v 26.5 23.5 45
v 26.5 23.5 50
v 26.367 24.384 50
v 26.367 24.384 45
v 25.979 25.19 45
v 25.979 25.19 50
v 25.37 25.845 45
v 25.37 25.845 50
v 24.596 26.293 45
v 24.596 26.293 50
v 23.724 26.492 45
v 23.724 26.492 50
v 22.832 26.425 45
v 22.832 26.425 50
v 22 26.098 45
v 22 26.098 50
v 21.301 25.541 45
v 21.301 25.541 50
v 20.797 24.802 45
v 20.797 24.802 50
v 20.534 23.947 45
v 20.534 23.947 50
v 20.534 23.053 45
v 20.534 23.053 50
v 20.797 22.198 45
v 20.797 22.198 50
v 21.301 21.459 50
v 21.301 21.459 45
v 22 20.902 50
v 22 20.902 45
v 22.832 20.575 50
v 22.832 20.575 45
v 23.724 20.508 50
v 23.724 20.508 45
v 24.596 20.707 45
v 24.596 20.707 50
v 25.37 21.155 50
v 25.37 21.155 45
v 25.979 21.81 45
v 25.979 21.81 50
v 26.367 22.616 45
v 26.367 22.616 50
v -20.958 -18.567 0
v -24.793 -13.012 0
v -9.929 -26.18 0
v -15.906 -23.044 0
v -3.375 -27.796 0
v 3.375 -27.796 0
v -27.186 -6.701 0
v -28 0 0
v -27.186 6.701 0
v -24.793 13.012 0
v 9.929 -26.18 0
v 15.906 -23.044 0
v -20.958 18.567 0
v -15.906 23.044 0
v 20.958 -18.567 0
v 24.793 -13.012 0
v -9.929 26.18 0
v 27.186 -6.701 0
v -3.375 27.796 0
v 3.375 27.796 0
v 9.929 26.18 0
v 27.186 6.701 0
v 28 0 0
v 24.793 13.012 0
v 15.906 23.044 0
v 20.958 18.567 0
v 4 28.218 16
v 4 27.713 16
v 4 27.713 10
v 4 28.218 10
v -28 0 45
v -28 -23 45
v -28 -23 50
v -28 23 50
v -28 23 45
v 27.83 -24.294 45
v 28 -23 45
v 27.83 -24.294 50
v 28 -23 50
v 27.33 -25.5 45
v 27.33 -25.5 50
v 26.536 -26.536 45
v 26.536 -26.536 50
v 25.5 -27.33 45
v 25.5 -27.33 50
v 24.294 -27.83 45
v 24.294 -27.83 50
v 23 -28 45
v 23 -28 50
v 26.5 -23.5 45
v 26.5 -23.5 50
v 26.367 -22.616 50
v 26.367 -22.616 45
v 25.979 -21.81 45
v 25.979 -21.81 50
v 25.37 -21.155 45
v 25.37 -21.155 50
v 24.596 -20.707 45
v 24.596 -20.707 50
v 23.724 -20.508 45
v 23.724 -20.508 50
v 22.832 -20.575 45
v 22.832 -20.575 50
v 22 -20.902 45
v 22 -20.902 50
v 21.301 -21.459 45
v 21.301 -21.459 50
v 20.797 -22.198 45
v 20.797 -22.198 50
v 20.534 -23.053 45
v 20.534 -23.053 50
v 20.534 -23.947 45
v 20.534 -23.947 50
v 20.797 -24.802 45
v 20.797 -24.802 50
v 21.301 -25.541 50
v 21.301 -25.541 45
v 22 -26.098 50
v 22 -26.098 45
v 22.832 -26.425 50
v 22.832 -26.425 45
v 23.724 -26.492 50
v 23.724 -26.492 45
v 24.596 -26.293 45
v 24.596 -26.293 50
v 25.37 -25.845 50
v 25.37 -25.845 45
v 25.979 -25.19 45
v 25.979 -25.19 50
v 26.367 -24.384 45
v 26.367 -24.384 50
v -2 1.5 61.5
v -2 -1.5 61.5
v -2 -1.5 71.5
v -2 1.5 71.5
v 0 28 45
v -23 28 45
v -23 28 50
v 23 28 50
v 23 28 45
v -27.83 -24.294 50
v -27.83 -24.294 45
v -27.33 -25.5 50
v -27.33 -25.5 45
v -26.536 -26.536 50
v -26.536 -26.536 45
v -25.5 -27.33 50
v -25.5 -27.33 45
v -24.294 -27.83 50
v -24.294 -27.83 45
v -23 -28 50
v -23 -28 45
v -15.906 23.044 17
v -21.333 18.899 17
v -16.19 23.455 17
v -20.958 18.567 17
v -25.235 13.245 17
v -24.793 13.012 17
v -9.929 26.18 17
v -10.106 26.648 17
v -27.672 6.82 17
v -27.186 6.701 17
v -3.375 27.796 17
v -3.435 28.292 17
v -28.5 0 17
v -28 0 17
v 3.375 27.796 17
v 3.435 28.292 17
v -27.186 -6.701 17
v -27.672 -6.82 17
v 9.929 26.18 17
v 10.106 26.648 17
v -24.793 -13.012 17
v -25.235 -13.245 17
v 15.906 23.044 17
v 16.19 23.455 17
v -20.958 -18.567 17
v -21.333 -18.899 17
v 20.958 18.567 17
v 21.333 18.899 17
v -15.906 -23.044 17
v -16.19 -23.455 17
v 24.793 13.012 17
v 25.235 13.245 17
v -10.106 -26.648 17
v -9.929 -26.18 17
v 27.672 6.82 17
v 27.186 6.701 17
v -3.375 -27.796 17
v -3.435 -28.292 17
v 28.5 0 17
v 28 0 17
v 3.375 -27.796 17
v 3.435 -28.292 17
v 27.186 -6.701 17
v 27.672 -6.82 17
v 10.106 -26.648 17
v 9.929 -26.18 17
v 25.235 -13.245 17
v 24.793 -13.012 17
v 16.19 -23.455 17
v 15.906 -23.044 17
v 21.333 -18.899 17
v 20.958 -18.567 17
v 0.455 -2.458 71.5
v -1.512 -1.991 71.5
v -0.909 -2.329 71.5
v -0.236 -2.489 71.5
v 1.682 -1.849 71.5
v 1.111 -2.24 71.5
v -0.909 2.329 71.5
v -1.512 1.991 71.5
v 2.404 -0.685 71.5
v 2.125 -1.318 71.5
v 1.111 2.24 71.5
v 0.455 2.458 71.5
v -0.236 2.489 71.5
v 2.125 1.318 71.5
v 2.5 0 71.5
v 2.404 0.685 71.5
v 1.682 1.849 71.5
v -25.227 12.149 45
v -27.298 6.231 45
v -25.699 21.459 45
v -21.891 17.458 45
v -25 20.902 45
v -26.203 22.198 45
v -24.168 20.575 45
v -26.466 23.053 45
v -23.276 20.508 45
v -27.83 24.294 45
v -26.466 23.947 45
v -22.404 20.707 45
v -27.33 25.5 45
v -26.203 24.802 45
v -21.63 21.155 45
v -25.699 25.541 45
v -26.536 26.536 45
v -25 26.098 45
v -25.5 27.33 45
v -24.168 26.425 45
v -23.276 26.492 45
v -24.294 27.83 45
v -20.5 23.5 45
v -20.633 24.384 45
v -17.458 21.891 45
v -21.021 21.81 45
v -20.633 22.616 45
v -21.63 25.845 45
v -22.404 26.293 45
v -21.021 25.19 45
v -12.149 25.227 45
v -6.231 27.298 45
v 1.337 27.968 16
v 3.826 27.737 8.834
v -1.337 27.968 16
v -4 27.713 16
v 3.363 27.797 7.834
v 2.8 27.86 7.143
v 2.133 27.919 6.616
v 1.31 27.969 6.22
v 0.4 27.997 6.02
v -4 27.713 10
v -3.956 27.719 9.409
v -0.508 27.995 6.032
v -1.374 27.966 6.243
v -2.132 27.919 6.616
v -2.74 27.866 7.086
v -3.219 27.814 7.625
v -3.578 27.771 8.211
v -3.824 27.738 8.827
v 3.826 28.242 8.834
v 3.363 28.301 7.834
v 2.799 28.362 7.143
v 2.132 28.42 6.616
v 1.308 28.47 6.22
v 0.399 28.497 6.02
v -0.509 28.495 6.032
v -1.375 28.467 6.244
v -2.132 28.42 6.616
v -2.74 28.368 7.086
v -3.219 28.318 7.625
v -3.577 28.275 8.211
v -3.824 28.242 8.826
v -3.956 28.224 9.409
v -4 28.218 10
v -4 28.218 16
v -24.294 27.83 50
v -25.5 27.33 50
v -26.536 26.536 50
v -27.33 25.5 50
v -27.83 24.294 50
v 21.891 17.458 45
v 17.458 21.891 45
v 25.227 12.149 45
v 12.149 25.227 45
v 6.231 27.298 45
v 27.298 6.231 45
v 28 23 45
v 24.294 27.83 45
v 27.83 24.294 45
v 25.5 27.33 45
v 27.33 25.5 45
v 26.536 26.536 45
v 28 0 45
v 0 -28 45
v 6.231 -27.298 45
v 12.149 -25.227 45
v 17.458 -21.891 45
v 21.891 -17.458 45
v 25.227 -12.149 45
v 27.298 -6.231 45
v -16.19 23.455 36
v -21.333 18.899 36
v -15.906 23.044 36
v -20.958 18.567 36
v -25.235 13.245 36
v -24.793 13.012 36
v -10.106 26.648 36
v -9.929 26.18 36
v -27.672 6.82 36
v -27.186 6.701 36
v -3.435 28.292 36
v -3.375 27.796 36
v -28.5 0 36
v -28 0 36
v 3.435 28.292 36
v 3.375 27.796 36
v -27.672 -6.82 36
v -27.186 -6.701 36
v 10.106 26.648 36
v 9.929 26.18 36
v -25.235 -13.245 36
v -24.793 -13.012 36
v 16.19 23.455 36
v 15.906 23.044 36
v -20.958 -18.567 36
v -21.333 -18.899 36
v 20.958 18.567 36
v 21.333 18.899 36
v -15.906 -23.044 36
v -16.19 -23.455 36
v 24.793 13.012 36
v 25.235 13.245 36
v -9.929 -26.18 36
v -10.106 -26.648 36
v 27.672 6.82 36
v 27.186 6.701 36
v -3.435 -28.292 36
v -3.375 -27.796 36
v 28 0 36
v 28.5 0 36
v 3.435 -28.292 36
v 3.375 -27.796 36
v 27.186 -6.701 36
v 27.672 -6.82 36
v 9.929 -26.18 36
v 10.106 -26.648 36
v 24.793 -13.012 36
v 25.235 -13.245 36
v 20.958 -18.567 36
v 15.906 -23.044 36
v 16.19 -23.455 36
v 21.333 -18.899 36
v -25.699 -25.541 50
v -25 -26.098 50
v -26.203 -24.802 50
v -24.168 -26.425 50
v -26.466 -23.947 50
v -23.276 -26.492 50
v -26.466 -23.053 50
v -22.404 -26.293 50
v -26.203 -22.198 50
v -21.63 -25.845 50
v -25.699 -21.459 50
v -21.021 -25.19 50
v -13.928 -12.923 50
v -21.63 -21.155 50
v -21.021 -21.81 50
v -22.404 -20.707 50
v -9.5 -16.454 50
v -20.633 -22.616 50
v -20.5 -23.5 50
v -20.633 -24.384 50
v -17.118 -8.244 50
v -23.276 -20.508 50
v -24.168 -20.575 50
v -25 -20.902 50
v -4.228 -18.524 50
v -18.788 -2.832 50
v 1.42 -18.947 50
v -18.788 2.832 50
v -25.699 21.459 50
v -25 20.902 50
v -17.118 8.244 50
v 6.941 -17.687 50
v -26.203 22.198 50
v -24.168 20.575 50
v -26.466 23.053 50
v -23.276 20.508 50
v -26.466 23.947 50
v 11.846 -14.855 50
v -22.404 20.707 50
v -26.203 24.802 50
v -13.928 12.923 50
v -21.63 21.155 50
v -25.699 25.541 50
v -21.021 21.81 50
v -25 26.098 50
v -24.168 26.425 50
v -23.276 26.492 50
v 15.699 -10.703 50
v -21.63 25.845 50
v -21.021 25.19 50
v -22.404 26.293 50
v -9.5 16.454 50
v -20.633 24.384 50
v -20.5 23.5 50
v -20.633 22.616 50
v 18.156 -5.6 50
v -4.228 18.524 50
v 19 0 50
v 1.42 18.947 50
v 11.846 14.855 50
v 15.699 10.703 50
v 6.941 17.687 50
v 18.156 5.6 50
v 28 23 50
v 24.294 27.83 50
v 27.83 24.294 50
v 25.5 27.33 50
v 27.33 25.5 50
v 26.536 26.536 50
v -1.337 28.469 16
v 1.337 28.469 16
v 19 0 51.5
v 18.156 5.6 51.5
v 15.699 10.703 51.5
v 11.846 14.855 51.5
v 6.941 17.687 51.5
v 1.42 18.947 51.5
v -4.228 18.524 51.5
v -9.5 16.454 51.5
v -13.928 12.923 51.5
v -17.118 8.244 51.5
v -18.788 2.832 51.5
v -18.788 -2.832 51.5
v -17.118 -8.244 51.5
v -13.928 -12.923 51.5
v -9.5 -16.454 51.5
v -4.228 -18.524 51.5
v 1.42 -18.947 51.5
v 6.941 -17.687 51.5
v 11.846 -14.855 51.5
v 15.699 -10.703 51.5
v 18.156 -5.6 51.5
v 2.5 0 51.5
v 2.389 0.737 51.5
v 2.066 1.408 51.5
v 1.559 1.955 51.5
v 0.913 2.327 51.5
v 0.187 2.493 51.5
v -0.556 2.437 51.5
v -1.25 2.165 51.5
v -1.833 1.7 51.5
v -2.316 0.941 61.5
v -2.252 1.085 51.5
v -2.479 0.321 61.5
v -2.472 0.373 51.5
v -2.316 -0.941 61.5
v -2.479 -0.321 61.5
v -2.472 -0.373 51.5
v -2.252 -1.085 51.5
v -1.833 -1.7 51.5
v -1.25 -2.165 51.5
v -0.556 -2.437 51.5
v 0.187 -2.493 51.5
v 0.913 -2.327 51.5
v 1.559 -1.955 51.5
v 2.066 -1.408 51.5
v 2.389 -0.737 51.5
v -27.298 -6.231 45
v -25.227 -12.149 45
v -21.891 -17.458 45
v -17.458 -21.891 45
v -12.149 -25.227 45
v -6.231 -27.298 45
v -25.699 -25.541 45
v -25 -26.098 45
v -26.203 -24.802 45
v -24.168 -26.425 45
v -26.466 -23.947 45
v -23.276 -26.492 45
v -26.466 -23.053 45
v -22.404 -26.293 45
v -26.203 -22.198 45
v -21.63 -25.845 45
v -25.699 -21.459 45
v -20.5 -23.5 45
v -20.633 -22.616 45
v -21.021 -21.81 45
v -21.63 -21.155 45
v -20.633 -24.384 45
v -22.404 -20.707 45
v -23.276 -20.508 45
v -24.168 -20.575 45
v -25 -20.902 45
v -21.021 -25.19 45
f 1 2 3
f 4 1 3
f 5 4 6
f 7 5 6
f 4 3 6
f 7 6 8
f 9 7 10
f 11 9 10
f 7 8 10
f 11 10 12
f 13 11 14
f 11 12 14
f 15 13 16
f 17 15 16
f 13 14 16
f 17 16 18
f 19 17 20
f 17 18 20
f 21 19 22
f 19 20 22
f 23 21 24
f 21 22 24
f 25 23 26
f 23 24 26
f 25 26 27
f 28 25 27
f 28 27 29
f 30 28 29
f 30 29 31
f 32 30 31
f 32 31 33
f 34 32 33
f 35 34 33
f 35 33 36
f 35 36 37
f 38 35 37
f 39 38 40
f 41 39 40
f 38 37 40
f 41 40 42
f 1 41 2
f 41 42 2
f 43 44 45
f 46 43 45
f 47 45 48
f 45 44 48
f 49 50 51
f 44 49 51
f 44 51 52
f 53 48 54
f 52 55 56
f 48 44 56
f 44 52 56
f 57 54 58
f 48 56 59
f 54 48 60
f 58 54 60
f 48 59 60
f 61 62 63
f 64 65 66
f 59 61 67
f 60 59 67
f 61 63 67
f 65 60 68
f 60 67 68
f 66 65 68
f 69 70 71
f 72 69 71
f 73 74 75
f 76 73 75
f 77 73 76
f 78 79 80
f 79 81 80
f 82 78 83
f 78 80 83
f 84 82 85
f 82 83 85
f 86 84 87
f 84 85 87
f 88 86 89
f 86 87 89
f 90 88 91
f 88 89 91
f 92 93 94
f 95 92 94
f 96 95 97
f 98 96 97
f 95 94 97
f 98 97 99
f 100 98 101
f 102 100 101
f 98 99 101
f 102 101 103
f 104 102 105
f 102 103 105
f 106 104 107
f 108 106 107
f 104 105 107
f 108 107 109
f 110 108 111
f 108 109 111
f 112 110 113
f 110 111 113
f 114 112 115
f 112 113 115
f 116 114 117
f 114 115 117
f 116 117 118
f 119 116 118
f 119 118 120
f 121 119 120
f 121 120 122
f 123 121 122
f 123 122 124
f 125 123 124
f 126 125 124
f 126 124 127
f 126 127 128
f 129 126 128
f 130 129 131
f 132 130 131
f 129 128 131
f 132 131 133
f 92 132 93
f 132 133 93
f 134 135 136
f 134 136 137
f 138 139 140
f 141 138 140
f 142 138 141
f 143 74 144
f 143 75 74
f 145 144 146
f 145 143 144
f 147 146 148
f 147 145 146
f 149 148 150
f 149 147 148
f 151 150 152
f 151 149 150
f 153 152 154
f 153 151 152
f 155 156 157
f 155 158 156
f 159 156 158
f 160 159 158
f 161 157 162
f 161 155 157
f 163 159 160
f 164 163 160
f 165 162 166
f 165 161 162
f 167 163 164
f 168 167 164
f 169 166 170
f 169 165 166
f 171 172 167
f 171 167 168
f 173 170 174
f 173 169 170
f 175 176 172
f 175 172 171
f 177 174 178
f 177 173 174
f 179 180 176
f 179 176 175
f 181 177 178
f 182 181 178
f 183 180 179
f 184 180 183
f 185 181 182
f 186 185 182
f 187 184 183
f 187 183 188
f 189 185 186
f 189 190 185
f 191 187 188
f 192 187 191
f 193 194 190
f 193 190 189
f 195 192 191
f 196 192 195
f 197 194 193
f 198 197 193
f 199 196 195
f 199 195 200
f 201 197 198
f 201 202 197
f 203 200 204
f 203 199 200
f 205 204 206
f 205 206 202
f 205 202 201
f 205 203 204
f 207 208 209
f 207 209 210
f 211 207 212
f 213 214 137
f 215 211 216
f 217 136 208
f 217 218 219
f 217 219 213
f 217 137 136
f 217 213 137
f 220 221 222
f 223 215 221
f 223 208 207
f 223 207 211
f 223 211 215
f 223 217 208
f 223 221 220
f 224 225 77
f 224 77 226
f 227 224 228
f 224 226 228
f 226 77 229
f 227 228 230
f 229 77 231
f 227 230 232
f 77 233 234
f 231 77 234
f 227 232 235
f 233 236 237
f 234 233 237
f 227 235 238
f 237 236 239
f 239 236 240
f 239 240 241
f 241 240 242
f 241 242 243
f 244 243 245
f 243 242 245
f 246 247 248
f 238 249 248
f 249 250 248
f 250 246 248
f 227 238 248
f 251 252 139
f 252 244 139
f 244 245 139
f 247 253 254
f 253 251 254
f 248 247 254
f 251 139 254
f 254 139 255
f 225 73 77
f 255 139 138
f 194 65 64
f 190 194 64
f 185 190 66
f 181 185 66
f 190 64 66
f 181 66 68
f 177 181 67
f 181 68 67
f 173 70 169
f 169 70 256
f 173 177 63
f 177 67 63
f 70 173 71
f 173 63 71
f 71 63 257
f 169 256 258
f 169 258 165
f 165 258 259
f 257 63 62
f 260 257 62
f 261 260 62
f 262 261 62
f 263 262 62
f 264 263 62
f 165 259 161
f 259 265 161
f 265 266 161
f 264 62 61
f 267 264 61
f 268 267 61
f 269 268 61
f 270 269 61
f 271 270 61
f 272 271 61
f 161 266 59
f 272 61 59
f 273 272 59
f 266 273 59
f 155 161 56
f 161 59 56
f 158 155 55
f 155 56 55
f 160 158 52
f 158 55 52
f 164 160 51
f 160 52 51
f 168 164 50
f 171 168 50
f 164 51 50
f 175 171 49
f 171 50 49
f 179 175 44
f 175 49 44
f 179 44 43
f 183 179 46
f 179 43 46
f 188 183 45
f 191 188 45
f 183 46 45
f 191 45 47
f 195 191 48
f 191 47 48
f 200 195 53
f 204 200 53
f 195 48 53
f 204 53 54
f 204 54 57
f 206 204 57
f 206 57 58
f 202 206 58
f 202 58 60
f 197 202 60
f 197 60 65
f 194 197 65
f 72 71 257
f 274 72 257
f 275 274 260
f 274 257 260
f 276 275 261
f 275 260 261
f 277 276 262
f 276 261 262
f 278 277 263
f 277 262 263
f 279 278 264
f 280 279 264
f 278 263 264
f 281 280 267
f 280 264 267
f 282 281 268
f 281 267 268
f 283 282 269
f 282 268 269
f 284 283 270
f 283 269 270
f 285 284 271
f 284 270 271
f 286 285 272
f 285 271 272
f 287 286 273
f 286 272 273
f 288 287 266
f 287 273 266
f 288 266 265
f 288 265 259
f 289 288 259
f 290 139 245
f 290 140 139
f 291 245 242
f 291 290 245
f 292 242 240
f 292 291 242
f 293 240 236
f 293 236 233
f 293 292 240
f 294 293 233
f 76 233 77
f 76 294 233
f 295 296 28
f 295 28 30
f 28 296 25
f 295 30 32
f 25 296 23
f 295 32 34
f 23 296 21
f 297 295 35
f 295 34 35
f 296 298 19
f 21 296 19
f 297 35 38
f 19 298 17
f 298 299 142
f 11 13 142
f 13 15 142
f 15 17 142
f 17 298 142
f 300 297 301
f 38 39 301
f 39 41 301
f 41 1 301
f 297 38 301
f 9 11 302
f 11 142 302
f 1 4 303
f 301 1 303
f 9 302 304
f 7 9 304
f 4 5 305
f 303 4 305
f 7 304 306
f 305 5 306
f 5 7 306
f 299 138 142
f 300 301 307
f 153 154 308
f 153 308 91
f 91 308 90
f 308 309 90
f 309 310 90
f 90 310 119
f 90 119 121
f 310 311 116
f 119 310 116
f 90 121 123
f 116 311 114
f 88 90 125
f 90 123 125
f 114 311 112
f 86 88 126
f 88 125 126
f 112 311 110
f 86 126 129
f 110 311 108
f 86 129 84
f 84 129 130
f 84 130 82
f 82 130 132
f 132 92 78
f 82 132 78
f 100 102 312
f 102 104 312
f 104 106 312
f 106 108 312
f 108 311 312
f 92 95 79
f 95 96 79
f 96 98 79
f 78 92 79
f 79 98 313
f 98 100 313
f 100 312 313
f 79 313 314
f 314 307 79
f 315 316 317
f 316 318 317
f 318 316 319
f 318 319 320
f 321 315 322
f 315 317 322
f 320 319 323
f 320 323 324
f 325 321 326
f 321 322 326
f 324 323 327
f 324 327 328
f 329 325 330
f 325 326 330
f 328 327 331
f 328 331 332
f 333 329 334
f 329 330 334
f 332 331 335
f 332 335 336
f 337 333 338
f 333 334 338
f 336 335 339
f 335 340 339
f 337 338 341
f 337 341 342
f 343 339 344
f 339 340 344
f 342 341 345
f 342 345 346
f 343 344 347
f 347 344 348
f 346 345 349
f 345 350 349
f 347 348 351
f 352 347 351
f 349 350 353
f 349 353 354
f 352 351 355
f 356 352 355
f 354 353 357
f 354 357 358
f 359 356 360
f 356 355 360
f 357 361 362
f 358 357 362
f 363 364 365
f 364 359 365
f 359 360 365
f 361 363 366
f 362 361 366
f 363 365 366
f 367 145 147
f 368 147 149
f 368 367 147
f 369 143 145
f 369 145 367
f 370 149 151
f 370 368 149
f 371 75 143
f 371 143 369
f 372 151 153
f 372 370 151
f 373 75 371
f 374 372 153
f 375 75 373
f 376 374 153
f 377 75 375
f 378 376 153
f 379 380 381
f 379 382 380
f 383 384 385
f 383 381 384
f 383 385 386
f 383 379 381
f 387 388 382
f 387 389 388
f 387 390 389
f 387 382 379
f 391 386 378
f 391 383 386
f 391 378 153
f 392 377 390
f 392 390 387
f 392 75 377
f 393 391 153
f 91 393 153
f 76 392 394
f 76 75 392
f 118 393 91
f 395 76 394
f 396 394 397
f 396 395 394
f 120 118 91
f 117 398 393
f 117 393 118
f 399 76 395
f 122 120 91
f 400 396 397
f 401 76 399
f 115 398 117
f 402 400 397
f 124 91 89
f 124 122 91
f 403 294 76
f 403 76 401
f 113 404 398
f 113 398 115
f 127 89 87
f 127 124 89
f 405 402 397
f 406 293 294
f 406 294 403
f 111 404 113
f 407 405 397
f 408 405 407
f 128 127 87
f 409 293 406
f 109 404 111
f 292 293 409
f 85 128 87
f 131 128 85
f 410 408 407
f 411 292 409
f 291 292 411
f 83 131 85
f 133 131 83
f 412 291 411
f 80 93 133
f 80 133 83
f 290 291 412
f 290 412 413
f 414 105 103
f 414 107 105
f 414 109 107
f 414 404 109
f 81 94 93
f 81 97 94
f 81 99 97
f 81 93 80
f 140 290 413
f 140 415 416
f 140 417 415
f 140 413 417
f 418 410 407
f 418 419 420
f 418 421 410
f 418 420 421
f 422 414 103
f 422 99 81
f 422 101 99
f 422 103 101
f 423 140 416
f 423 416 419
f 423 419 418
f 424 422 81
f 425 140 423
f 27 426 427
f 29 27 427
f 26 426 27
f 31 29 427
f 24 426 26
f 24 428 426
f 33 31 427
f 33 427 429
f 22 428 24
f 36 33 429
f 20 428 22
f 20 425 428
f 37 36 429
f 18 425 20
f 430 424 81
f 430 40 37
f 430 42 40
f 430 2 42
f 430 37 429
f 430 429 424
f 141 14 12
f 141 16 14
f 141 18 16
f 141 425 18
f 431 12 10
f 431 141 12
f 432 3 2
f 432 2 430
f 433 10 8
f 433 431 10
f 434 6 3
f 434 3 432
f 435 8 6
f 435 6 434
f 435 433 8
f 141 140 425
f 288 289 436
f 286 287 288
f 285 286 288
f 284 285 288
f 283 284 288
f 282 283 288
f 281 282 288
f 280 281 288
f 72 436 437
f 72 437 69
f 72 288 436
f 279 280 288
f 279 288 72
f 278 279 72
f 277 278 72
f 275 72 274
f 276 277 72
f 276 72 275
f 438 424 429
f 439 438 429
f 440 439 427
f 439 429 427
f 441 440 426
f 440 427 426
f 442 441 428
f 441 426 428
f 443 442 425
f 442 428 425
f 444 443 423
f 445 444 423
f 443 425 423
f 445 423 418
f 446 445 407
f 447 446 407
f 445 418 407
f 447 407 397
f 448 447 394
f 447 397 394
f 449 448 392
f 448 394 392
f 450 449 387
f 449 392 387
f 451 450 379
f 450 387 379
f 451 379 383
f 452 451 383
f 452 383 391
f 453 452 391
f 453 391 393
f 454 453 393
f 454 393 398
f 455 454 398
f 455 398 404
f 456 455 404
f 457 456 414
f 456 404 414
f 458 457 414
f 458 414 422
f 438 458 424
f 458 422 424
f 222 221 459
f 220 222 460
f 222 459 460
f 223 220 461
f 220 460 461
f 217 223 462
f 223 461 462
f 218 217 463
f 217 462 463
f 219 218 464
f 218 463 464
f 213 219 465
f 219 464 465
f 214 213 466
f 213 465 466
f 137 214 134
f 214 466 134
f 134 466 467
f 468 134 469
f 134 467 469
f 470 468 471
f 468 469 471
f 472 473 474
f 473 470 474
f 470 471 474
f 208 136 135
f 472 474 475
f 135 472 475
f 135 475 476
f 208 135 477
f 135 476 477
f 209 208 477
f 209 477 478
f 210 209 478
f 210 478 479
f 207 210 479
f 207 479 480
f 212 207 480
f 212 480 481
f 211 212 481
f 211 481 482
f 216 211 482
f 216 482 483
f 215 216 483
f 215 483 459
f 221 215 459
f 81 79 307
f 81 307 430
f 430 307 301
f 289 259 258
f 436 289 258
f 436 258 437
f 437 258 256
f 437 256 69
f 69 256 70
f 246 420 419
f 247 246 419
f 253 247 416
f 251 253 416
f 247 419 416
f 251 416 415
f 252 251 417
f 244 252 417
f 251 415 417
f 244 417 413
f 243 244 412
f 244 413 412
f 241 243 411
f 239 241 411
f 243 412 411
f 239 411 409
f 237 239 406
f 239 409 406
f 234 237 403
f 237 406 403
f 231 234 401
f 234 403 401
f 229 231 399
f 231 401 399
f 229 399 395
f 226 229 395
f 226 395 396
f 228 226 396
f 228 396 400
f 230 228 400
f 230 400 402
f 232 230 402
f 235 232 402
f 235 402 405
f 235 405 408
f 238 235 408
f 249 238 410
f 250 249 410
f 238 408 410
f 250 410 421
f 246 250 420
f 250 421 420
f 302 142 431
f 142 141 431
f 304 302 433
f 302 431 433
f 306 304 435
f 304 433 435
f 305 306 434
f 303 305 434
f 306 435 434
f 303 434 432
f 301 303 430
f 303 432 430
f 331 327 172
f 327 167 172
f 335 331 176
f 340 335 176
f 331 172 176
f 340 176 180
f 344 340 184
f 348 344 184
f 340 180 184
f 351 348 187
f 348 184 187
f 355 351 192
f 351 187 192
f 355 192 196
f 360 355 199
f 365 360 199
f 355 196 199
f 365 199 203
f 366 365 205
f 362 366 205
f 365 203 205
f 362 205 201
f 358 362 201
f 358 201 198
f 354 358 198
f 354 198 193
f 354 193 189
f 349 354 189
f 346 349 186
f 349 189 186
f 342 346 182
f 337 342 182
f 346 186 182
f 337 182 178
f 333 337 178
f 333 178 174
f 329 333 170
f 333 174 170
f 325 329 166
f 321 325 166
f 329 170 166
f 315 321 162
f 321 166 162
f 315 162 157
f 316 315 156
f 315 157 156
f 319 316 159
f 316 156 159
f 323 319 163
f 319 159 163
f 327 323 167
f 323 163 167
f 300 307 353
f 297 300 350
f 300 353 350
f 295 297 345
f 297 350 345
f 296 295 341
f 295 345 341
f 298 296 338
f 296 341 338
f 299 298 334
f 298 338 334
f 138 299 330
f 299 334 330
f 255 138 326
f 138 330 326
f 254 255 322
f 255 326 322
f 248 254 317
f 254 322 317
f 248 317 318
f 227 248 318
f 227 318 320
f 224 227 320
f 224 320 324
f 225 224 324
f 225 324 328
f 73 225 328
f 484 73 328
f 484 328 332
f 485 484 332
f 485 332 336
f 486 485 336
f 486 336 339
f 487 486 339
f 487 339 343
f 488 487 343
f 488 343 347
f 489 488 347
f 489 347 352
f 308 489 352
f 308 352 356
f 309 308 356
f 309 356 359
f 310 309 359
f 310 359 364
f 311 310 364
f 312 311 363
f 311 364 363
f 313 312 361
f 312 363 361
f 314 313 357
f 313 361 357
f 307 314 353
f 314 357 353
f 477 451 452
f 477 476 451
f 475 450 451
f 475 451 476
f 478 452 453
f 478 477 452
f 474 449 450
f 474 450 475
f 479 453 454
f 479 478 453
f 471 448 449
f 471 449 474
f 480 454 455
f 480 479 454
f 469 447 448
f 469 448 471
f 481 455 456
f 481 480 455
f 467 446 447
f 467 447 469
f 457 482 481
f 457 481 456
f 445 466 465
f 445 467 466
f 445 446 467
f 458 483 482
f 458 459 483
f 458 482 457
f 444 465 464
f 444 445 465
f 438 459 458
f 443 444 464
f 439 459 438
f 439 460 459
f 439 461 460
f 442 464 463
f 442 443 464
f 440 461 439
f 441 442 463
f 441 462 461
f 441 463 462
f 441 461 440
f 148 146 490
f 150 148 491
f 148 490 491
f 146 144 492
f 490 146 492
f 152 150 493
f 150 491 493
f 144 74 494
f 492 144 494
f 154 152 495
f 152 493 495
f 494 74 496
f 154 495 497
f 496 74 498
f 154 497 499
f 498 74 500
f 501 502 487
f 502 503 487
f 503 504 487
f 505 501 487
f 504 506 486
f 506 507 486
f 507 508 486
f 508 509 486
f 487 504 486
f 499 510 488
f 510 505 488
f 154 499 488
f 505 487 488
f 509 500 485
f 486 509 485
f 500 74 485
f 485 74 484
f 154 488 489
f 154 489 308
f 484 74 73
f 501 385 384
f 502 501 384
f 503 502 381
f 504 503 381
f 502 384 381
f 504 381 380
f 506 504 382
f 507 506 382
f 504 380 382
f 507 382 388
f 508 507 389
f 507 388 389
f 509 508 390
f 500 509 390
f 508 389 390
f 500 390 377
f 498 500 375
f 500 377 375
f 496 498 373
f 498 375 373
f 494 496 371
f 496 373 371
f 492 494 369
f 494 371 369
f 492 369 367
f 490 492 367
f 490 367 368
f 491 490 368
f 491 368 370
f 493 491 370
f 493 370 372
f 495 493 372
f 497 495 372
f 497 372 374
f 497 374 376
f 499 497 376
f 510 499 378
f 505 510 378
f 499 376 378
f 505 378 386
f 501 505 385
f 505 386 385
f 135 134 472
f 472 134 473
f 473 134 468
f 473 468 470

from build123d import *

# Parameters (mm, degrees)
SKETCH1_R           = 28
EXTRUDE1_DEPTH      = 45
SKETCH2_W           = 56
SKETCH2_H           = 56
EXTRUDE2_DEPTH      = 5
SKETCH4_R           = 3
EXTRUDE3_DEPTH      = 5
SKETCH5_W           = 0.5
SKETCH5_H           = 19
SKETCH7_R           = 19
EXTRUDE4_DEPTH      = 1.5
SKETCH9_R           = 2.5
EXTRUDE5_DEPTH      = 20
SKETCH10_W          = 5
SKETCH10_H          = 3
EXTRUDE6_DEPTH      = 10
FILLET1_R           = 5
EXTRUDE7_REACH      = 84.078
EXTRUDE7_END_RADIUS = 28.5


with BuildPart() as part:
    # Sketch1 → Extrude1 (new body)
    with BuildSketch(Plane.XY):
        Circle(SKETCH1_R)
    extrude(amount=EXTRUDE1_DEPTH)

    # Sketch2 → Extrude2 (add)
    with BuildSketch(Plane.XY.offset(45)):
        Rectangle(SKETCH2_W, SKETCH2_H)
    extrude(amount=EXTRUDE2_DEPTH)

    # Sketch4 → Extrude3 (cut)
    with BuildSketch(Plane.XY.offset(50)):
        with Locations((-23.5, 23.5)):
            Circle(SKETCH4_R)
        with Locations((23.5, 23.5)):
            Circle(SKETCH4_R)
        with Locations((-23.5, -23.5)):
            Circle(SKETCH4_R)
        with Locations((23.5, -23.5)):
            Circle(SKETCH4_R)
    extrude(amount=-EXTRUDE3_DEPTH, mode=Mode.SUBTRACT)

    # Sketch5 → Revolve2 (revolve)
    with BuildSketch(Plane(origin=(0, 0, 0), x_dir=(1, 0, 0), z_dir=(0, 1, 0)), mode=Mode.PRIVATE) as revolve2_sk:
        with Locations((28.25, -26.5)):
            Rectangle(SKETCH5_W, SKETCH5_H)
    revolve(revolve2_sk.sketch.rotate(Axis((0, 0, 0), (0, 0, 1)), 180), axis=Axis((0, 0, 0), (0, 0, 1)))

    # Sketch7 → Extrude4 (add)
    with BuildSketch(Plane.XY.offset(50)):
        Circle(SKETCH7_R)
    extrude(amount=EXTRUDE4_DEPTH)

    # Sketch9 → Extrude5 (add)
    with BuildSketch(Plane.XY.offset(51.5)):
        Circle(SKETCH9_R)
    extrude(amount=EXTRUDE5_DEPTH)

    # Sketch10 → Extrude6 (cut)
    with BuildSketch(Plane.XY.offset(71.5)):
        with Locations((-4.5, 0)):
            Rectangle(SKETCH10_W, SKETCH10_H)
    extrude(amount=-EXTRUDE6_DEPTH, mode=Mode.SUBTRACT)

    # Fillet1
    fillet1_edges = [part.edges().sort_by_distance(p)[0] for p in [
        (28, -28, 47.5),
        (28, 28, 47.5),
        (-28, 28, 47.5),
        (-28, -28, 47.5),
    ]]
    fillet(fillet1_edges, radius=FILLET1_R)

    # Extrude7: up to this cylinder (the profile starts inside it)
    extrude7_end = Plane(origin=(0, 0, 11.385608), z_dir=(0, 0, -1)) * Cylinder(EXTRUDE7_END_RADIUS, 226.156, mode=Mode.PRIVATE)
    # Sketch11 → Extrude7 (add, up to the surface)
    with BuildSketch(Plane(origin=(0, 0, 0), x_dir=(1, 0, 0), z_dir=(0, 1, 0)), mode=Mode.PRIVATE) as extrude7_sk1:
        with BuildLine():
            Line((-4, -16), (4, -16))
            Line((4, -16), (4, -10))
            ThreePointArc((4, -10), (0, -6), (-4, -10))
            Line((-4, -10), (-4, -16))
        make_face()
    extrude7_tool1 = extrude(extrude7_sk1.sketch, amount=EXTRUDE7_REACH, mode=Mode.PRIVATE) & extrude7_end
    add(extrude7_tool1.solids().sort_by_distance((0, 0, 11.385608))[0])


solid = part.part
